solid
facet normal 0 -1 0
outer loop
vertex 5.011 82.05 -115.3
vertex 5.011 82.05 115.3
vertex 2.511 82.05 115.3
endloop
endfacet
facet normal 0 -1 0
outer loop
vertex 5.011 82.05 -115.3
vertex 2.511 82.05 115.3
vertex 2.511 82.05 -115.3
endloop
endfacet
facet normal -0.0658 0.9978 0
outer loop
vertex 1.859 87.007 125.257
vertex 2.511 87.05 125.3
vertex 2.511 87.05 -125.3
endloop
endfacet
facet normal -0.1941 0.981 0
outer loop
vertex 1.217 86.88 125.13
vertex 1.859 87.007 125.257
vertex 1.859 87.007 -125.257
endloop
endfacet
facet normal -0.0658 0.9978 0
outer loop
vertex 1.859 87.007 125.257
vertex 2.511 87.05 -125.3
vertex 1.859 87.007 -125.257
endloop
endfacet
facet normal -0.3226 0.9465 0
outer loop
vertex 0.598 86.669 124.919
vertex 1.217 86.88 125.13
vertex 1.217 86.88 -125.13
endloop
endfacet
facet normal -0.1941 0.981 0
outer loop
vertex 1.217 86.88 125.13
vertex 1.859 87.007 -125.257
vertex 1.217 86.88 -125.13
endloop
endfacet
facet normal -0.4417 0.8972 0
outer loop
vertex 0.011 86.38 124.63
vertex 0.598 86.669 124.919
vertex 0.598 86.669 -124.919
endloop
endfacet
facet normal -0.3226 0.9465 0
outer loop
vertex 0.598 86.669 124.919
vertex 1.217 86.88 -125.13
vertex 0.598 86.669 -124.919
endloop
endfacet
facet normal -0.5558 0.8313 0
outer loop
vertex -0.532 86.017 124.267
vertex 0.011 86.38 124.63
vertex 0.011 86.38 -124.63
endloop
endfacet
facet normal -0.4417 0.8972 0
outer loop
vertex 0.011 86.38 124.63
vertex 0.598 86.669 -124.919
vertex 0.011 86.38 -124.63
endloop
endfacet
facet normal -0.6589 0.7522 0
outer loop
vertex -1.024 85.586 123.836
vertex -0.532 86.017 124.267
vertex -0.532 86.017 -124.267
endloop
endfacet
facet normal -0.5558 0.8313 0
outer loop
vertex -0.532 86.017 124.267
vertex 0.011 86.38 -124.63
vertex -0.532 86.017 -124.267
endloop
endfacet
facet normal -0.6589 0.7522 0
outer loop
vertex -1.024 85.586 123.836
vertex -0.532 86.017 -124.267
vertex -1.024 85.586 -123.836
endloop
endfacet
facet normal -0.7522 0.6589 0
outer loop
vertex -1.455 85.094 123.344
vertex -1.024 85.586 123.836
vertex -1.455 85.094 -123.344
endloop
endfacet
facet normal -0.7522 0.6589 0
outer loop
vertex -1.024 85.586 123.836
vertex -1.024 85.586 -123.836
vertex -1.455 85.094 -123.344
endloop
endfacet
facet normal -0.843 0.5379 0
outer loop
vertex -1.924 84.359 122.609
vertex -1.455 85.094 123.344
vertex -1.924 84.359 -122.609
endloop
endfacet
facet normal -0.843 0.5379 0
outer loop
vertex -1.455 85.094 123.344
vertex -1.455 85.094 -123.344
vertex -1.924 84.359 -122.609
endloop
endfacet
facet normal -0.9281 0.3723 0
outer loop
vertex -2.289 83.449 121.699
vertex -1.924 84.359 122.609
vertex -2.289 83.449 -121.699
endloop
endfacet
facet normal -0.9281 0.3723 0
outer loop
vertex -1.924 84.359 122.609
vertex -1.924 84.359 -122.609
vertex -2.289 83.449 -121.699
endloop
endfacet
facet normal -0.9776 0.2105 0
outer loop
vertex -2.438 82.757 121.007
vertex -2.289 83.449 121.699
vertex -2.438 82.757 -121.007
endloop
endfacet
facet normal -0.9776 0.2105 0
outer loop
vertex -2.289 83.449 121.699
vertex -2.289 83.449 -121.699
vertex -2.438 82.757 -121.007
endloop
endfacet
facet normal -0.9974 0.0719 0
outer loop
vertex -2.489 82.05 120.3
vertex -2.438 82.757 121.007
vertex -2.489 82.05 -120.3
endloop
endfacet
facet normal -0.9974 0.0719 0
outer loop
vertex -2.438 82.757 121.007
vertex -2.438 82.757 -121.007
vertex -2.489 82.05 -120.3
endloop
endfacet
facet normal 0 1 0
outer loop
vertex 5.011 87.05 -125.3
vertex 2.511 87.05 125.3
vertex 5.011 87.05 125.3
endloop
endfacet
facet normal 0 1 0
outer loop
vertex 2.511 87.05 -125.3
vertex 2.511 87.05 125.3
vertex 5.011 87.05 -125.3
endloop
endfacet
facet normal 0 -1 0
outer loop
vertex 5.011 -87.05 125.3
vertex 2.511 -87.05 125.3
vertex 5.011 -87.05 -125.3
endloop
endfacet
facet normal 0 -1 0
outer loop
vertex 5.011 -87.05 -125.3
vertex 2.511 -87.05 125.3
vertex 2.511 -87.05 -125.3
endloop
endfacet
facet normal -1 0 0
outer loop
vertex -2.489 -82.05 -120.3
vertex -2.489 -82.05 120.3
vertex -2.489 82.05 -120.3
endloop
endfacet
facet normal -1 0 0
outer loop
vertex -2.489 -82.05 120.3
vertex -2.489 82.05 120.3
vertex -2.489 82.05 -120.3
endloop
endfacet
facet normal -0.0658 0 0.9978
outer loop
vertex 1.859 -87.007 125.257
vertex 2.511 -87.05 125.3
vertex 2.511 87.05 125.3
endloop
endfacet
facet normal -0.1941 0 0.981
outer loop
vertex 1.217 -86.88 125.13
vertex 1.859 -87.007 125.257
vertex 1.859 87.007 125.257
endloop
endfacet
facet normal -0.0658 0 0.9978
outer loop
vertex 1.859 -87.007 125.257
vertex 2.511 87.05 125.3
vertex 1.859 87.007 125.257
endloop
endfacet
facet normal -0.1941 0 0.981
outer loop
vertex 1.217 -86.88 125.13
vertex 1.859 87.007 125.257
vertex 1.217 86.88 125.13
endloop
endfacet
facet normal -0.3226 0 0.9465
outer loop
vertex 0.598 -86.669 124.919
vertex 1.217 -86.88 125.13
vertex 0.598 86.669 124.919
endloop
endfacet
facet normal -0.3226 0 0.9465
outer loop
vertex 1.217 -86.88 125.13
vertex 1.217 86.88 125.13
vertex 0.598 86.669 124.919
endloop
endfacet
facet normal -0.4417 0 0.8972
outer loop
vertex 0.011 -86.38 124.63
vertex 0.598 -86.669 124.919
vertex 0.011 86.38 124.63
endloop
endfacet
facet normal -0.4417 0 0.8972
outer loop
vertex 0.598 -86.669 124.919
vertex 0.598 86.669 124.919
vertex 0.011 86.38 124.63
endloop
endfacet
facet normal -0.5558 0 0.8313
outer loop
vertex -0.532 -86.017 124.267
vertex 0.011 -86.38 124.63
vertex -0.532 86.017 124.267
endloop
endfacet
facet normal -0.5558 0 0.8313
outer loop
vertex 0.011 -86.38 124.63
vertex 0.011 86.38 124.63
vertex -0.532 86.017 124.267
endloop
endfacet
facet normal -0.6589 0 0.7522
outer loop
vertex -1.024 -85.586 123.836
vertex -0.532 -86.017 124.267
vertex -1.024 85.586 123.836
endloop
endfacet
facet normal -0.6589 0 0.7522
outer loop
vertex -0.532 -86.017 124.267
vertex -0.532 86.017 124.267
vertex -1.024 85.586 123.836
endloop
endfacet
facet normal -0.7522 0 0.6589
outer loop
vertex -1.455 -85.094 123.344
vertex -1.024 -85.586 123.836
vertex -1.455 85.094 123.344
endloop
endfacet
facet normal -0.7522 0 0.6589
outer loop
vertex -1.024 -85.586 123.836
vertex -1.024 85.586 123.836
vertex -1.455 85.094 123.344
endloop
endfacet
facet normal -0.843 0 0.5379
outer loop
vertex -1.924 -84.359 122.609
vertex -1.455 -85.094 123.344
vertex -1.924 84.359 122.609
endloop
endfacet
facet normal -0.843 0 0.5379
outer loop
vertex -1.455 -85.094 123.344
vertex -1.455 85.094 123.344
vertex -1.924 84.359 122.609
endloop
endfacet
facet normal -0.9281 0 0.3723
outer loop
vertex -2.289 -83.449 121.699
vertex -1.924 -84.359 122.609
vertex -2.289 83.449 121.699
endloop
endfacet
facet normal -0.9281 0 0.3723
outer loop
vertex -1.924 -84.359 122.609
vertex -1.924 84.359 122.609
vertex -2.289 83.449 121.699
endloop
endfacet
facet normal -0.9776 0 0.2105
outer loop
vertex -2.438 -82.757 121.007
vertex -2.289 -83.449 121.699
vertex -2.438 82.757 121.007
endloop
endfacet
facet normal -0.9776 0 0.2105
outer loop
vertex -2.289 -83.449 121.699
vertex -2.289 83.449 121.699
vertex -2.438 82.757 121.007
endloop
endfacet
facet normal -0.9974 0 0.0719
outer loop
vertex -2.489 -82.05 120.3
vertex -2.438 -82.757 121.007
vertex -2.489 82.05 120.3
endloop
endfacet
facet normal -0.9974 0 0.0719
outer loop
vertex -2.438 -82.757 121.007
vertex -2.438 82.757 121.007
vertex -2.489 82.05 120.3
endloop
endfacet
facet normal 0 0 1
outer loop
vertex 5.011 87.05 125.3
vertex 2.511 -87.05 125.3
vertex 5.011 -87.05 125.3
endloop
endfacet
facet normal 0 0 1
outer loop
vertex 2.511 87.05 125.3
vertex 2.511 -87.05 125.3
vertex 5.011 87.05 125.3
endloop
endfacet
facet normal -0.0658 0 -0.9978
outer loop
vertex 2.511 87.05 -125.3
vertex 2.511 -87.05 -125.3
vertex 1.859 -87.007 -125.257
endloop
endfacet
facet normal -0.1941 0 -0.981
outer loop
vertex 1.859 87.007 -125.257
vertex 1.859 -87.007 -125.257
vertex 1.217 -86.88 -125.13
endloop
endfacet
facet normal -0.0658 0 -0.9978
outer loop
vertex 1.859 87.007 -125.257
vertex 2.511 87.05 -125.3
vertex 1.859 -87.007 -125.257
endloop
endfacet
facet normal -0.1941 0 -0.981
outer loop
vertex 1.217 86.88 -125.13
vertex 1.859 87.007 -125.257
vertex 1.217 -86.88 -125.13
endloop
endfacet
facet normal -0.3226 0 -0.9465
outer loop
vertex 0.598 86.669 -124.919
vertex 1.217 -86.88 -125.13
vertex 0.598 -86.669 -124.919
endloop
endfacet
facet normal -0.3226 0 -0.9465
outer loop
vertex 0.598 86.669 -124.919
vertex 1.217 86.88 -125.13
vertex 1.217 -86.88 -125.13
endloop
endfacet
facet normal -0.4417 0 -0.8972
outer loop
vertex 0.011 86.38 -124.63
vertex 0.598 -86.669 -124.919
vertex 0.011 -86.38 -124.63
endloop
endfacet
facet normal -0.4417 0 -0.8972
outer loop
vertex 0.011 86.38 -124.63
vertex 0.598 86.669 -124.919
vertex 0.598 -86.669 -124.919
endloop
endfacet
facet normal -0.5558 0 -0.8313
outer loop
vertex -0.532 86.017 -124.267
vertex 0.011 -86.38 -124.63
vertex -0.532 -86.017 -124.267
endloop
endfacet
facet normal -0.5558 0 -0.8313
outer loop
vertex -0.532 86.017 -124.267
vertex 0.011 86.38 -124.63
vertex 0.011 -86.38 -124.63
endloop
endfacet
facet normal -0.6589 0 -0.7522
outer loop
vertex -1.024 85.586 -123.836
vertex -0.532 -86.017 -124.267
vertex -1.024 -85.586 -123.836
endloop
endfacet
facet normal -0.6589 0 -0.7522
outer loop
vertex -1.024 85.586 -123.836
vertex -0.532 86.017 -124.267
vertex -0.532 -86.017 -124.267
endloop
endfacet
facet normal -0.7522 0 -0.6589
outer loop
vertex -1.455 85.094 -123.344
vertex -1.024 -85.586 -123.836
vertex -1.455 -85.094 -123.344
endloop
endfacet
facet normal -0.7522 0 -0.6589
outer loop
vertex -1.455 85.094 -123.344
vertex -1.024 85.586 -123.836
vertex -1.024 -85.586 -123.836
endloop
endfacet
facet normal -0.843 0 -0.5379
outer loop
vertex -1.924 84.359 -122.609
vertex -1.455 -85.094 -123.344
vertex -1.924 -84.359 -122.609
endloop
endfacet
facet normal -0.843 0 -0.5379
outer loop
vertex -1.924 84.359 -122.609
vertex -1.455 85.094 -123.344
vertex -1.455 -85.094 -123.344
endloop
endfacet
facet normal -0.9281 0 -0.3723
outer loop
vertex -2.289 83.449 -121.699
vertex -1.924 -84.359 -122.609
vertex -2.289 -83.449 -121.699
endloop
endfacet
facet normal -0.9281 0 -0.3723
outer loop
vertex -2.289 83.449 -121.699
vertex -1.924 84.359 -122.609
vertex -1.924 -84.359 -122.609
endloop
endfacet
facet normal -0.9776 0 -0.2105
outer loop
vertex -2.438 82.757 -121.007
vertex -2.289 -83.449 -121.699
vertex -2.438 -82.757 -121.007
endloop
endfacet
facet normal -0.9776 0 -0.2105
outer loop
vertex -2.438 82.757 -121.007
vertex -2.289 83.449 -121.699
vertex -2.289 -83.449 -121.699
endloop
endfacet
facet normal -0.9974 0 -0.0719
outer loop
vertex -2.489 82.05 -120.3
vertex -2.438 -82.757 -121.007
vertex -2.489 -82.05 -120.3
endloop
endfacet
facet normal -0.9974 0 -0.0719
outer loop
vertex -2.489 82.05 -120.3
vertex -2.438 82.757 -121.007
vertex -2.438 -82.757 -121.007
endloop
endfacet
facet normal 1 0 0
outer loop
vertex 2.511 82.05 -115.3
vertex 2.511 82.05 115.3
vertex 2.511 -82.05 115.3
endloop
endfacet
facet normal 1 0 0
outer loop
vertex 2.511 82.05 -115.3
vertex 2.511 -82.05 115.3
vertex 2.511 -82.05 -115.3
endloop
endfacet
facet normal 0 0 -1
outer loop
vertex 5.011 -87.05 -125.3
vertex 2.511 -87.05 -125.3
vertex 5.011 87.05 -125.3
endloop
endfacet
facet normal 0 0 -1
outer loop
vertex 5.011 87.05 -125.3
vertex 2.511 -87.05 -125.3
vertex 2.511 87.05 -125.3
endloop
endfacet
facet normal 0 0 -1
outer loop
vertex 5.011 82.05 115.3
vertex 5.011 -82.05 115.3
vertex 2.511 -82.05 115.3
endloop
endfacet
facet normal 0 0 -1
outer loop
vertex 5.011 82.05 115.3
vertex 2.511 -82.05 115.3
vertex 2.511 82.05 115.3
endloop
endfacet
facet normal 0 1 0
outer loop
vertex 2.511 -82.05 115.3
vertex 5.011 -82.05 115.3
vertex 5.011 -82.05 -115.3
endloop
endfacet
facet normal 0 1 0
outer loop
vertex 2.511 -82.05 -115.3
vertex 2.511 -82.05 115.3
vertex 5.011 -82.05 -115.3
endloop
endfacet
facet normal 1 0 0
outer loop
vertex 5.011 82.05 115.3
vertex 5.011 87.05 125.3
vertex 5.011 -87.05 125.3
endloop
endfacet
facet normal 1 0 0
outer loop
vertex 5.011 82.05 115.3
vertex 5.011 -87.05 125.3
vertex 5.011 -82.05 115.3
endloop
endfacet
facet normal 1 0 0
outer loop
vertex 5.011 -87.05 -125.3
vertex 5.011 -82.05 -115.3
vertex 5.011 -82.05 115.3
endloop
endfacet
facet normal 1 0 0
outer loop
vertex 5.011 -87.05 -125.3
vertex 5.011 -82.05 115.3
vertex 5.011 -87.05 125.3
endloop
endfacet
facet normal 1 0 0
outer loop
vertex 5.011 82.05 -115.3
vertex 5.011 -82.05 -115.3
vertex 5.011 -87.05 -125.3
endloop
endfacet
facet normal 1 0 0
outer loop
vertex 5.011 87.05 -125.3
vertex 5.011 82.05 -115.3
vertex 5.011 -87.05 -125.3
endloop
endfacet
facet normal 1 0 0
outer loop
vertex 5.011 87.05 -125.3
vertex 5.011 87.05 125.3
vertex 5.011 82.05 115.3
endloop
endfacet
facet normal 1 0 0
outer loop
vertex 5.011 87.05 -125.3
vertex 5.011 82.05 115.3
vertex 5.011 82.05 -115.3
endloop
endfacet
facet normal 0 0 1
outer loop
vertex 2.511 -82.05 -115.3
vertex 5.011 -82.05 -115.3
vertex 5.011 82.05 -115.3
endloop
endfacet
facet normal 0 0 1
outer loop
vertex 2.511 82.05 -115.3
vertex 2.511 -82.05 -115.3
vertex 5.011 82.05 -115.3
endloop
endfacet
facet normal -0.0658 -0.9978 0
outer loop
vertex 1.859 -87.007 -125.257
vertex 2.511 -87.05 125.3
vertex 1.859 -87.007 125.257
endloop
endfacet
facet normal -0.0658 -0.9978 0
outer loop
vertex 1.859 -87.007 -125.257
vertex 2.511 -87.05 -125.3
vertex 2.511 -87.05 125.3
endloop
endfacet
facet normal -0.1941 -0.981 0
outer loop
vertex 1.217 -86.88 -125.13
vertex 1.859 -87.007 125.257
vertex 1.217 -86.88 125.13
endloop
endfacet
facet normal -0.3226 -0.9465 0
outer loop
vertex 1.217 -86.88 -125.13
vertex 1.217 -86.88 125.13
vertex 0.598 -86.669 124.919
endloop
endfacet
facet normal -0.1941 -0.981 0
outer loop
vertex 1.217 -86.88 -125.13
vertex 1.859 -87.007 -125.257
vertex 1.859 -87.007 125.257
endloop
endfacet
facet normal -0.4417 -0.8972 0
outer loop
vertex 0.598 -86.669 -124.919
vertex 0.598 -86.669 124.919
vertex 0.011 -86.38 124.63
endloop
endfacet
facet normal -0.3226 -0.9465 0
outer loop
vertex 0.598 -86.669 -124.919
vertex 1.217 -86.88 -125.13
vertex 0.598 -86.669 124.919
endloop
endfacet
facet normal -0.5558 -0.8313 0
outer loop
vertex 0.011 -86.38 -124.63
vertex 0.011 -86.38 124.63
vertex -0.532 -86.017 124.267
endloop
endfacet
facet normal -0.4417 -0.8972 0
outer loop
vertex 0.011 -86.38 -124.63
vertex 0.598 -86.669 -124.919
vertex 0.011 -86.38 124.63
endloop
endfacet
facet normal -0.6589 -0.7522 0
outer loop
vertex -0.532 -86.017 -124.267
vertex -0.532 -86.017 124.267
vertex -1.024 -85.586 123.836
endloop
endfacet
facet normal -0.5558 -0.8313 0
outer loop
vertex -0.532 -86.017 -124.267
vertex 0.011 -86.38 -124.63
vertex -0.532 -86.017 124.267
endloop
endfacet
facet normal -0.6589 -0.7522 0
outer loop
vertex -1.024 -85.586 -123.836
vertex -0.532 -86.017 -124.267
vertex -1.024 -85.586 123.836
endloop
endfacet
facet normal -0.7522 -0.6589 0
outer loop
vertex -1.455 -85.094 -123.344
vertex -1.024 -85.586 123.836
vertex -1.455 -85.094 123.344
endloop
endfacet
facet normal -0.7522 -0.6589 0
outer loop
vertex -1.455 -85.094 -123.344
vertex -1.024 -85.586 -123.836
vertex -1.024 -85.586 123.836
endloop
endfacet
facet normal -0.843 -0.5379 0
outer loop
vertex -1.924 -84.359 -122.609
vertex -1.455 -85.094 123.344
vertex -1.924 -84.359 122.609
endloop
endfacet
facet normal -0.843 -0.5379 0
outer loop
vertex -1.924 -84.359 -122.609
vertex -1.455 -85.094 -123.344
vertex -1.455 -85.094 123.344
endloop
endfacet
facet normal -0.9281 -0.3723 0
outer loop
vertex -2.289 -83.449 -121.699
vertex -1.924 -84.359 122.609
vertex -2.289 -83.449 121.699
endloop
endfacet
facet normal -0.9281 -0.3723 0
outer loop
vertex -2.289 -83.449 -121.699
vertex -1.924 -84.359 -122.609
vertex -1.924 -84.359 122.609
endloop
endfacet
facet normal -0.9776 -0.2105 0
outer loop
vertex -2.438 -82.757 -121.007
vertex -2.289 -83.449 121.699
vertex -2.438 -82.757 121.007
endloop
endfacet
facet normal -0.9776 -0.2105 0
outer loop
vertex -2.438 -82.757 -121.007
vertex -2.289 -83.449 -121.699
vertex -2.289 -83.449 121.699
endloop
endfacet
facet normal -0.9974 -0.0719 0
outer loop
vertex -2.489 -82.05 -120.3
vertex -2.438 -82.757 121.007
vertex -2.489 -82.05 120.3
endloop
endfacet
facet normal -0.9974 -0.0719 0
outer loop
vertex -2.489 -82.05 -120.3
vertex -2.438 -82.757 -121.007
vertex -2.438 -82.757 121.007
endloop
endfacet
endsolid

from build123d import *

# Parameters (mm, degrees)
SKETCH1_W           = 25.06
SKETCH1_H           = 17.41
BOSS_EXTRUDE1_DEPTH = 0.75
FILLET4_R           = 0.5
SKETCH2_W           = 23.06
SKETCH2_H           = 16.41
CUT_EXTRUDE1_DEPTH  = 0.25
SCALE1_SCALE        = 10


with BuildPart() as part:
    # Sketch1 → Boss-Extrude1 (new body)
    with BuildSketch(Plane(origin=(0, 0, 0), x_dir=(0, 0, -1), z_dir=(1, 0, 0))):
        Rectangle(SKETCH1_W, SKETCH1_H)
    extrude(amount=BOSS_EXTRUDE1_DEPTH)

    # Fillet4
    fillet4_edges = [part.edges().sort_by_distance(p)[0] for p in [
        (0, -8.705, 0),
        (0, 0, 12.53),
        (0, 8.705, 0),
        (0, 0, -12.53),
    ]]
    fillet(fillet4_edges, radius=FILLET4_R)

    # Sketch2 → Cut-Extrude1 (cut)
    with BuildSketch(Plane(origin=(0.75, 0, 0), x_dir=(0, 0, -1), z_dir=(1, 0, 0))):
        Rectangle(SKETCH2_W, SKETCH2_H)
    extrude(amount=-CUT_EXTRUDE1_DEPTH, mode=Mode.SUBTRACT)


with BuildPart() as part_1:
    # Scale1: scaled about (0.276512494, 0, 0)
    add(part.part.scale(SCALE1_SCALE).moved(Location((-2.488612446, 0, 0))))


solid = part_1.part
